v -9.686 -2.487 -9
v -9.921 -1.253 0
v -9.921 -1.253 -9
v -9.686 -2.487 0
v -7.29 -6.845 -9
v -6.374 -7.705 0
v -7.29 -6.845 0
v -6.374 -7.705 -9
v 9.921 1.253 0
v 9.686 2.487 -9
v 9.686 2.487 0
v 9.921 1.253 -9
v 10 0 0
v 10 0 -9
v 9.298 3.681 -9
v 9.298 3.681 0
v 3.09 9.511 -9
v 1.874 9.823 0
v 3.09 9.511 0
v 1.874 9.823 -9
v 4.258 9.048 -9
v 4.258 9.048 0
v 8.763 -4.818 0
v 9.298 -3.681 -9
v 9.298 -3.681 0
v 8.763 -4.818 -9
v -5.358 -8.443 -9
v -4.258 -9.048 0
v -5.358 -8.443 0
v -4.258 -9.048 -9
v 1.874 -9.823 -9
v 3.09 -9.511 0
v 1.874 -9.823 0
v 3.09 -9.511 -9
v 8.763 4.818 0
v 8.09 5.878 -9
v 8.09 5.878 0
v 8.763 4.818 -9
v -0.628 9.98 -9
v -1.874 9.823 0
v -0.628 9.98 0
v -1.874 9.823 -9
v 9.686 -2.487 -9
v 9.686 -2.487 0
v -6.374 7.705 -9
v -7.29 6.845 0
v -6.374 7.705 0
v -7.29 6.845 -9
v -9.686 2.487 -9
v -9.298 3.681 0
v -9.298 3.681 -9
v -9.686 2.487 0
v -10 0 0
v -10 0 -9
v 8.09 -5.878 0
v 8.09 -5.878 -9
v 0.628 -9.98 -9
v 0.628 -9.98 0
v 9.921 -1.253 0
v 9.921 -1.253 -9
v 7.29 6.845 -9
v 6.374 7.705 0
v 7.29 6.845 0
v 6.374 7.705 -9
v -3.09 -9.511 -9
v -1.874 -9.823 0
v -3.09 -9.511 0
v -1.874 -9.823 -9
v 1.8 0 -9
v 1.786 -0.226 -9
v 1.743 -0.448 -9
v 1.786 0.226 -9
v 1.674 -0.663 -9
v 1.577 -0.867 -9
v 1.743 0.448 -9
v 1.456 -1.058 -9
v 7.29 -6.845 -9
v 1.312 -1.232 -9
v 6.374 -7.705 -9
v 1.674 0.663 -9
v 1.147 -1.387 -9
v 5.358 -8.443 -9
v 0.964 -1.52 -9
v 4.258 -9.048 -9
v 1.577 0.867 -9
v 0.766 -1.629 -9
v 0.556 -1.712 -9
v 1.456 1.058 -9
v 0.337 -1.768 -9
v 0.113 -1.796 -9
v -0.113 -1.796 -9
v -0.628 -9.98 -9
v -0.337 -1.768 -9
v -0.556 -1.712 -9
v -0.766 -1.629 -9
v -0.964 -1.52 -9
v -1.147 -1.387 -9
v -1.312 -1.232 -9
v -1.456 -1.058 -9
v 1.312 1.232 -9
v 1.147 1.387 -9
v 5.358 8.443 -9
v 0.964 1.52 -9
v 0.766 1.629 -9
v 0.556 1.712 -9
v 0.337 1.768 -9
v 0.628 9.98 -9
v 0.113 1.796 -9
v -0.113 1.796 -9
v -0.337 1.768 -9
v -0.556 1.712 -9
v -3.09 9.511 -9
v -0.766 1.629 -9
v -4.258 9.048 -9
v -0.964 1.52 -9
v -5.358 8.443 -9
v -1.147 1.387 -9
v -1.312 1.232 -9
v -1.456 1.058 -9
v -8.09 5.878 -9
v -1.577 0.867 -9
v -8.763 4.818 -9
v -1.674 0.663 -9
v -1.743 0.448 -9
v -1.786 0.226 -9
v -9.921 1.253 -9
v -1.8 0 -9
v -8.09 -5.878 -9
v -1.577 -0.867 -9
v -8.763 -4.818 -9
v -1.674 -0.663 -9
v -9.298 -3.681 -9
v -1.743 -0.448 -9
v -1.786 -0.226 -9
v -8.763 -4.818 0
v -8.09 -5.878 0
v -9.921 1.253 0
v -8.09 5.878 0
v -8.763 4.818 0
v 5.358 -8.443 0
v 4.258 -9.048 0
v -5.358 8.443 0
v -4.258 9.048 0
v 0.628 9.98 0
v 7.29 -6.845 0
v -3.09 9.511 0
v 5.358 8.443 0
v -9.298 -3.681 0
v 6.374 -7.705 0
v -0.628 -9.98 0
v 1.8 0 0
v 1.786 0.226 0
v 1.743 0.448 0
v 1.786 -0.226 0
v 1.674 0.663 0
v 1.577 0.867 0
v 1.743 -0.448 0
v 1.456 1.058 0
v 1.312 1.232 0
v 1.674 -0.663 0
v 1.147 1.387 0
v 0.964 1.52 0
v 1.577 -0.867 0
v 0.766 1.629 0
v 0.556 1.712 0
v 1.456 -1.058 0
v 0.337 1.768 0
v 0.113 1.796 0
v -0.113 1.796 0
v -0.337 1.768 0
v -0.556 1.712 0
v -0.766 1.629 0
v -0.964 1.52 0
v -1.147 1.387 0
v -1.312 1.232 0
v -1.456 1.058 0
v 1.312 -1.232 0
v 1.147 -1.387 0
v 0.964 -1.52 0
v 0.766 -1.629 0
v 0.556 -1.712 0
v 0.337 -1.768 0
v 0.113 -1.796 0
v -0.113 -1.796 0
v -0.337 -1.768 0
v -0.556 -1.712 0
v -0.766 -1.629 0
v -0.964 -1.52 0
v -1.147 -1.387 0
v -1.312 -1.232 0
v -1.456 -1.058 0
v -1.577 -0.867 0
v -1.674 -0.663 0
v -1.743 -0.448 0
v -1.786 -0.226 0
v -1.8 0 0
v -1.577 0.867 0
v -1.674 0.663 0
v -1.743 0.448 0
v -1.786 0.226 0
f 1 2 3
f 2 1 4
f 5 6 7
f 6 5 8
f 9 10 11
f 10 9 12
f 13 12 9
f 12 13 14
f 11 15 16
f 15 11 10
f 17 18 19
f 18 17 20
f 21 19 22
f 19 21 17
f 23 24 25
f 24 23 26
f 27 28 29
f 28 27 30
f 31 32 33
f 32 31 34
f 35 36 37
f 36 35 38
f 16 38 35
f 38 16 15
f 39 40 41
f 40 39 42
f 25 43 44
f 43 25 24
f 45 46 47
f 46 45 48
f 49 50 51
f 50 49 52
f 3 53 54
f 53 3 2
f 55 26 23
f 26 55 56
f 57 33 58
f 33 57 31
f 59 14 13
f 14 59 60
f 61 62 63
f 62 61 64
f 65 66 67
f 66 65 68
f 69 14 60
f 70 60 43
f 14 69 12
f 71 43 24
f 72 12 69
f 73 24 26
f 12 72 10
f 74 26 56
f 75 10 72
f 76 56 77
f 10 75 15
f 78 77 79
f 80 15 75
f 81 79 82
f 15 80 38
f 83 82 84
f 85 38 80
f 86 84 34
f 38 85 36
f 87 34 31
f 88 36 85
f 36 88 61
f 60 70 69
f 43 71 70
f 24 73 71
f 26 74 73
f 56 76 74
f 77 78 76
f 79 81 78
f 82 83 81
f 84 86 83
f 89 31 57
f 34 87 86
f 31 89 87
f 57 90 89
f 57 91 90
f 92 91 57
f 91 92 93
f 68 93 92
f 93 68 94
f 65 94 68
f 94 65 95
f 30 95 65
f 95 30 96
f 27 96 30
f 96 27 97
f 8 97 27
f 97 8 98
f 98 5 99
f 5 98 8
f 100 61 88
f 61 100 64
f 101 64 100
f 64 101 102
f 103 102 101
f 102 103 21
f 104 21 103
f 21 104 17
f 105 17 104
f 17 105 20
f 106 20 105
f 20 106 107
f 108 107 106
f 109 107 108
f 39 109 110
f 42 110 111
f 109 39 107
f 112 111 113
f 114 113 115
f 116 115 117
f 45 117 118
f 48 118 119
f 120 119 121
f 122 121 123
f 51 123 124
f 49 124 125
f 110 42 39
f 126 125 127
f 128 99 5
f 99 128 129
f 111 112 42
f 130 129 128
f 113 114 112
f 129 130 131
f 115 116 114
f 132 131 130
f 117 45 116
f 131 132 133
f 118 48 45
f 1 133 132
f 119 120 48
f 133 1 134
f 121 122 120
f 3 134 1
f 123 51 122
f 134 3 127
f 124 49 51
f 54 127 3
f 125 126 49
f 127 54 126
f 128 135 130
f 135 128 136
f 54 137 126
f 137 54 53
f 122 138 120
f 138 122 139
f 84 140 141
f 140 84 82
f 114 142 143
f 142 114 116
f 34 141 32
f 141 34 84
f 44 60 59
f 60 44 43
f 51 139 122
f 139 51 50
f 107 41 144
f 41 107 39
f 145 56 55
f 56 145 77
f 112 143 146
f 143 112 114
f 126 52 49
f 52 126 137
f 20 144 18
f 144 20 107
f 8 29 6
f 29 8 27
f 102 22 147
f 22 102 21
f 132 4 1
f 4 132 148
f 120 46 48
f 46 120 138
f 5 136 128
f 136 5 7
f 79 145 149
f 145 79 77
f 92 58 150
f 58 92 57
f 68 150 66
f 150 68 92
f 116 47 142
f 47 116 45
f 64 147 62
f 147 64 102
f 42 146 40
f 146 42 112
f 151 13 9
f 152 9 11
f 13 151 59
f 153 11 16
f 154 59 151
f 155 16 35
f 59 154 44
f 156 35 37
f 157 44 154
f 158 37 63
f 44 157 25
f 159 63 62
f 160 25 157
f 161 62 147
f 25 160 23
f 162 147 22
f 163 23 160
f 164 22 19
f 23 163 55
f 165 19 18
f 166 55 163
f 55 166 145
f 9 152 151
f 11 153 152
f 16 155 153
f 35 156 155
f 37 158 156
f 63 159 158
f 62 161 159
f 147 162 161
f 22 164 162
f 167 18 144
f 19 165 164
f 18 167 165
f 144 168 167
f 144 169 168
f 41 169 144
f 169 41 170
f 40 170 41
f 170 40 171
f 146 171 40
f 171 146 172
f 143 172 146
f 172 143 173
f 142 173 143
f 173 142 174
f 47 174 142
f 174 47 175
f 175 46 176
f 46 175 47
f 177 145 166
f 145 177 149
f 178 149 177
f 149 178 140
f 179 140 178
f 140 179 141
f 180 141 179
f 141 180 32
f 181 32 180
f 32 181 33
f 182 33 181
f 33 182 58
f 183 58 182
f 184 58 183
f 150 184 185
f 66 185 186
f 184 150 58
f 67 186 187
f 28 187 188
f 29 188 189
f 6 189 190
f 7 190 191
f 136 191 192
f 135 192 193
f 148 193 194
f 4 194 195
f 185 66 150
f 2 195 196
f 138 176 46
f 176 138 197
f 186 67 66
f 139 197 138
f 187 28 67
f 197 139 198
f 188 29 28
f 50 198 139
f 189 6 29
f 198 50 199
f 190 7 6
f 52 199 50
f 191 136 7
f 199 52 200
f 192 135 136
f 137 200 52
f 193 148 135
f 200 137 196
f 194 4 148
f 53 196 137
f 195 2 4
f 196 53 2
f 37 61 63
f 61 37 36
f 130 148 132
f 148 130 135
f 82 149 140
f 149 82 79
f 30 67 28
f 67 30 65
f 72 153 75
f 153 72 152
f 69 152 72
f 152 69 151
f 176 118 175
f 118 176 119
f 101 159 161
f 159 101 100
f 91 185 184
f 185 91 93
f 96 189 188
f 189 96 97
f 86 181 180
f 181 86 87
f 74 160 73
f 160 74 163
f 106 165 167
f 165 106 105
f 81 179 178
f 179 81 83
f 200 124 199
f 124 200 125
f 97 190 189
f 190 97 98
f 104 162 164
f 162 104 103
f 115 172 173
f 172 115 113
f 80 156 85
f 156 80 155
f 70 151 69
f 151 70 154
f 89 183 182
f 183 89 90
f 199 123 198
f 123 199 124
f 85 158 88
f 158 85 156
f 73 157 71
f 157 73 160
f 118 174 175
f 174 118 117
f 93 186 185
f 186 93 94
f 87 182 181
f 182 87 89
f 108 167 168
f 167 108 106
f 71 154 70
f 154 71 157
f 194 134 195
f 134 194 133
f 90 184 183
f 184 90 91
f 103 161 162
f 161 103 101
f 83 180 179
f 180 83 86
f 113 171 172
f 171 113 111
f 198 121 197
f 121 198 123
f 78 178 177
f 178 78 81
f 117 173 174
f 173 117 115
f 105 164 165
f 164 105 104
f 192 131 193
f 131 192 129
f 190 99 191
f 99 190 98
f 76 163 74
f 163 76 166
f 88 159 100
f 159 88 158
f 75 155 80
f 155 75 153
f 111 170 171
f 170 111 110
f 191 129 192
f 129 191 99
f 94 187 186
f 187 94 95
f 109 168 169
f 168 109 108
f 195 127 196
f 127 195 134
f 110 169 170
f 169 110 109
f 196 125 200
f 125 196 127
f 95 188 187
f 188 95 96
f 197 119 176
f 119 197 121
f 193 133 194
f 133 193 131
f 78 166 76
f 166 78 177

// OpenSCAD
$fn = 50;


difference() {
	union() {
		translate(v = [0, 0, -9.0000000000]) {
			cylinder(h = 9, r = 10.0000000000);
		}
		cylinder(h = 0, r = 19.0000000000);
	}
	union() {
		#translate(v = [0, 0, -9]) {
			cylinder(h = 9, r = 1.8000000000);
		}
	}
}
